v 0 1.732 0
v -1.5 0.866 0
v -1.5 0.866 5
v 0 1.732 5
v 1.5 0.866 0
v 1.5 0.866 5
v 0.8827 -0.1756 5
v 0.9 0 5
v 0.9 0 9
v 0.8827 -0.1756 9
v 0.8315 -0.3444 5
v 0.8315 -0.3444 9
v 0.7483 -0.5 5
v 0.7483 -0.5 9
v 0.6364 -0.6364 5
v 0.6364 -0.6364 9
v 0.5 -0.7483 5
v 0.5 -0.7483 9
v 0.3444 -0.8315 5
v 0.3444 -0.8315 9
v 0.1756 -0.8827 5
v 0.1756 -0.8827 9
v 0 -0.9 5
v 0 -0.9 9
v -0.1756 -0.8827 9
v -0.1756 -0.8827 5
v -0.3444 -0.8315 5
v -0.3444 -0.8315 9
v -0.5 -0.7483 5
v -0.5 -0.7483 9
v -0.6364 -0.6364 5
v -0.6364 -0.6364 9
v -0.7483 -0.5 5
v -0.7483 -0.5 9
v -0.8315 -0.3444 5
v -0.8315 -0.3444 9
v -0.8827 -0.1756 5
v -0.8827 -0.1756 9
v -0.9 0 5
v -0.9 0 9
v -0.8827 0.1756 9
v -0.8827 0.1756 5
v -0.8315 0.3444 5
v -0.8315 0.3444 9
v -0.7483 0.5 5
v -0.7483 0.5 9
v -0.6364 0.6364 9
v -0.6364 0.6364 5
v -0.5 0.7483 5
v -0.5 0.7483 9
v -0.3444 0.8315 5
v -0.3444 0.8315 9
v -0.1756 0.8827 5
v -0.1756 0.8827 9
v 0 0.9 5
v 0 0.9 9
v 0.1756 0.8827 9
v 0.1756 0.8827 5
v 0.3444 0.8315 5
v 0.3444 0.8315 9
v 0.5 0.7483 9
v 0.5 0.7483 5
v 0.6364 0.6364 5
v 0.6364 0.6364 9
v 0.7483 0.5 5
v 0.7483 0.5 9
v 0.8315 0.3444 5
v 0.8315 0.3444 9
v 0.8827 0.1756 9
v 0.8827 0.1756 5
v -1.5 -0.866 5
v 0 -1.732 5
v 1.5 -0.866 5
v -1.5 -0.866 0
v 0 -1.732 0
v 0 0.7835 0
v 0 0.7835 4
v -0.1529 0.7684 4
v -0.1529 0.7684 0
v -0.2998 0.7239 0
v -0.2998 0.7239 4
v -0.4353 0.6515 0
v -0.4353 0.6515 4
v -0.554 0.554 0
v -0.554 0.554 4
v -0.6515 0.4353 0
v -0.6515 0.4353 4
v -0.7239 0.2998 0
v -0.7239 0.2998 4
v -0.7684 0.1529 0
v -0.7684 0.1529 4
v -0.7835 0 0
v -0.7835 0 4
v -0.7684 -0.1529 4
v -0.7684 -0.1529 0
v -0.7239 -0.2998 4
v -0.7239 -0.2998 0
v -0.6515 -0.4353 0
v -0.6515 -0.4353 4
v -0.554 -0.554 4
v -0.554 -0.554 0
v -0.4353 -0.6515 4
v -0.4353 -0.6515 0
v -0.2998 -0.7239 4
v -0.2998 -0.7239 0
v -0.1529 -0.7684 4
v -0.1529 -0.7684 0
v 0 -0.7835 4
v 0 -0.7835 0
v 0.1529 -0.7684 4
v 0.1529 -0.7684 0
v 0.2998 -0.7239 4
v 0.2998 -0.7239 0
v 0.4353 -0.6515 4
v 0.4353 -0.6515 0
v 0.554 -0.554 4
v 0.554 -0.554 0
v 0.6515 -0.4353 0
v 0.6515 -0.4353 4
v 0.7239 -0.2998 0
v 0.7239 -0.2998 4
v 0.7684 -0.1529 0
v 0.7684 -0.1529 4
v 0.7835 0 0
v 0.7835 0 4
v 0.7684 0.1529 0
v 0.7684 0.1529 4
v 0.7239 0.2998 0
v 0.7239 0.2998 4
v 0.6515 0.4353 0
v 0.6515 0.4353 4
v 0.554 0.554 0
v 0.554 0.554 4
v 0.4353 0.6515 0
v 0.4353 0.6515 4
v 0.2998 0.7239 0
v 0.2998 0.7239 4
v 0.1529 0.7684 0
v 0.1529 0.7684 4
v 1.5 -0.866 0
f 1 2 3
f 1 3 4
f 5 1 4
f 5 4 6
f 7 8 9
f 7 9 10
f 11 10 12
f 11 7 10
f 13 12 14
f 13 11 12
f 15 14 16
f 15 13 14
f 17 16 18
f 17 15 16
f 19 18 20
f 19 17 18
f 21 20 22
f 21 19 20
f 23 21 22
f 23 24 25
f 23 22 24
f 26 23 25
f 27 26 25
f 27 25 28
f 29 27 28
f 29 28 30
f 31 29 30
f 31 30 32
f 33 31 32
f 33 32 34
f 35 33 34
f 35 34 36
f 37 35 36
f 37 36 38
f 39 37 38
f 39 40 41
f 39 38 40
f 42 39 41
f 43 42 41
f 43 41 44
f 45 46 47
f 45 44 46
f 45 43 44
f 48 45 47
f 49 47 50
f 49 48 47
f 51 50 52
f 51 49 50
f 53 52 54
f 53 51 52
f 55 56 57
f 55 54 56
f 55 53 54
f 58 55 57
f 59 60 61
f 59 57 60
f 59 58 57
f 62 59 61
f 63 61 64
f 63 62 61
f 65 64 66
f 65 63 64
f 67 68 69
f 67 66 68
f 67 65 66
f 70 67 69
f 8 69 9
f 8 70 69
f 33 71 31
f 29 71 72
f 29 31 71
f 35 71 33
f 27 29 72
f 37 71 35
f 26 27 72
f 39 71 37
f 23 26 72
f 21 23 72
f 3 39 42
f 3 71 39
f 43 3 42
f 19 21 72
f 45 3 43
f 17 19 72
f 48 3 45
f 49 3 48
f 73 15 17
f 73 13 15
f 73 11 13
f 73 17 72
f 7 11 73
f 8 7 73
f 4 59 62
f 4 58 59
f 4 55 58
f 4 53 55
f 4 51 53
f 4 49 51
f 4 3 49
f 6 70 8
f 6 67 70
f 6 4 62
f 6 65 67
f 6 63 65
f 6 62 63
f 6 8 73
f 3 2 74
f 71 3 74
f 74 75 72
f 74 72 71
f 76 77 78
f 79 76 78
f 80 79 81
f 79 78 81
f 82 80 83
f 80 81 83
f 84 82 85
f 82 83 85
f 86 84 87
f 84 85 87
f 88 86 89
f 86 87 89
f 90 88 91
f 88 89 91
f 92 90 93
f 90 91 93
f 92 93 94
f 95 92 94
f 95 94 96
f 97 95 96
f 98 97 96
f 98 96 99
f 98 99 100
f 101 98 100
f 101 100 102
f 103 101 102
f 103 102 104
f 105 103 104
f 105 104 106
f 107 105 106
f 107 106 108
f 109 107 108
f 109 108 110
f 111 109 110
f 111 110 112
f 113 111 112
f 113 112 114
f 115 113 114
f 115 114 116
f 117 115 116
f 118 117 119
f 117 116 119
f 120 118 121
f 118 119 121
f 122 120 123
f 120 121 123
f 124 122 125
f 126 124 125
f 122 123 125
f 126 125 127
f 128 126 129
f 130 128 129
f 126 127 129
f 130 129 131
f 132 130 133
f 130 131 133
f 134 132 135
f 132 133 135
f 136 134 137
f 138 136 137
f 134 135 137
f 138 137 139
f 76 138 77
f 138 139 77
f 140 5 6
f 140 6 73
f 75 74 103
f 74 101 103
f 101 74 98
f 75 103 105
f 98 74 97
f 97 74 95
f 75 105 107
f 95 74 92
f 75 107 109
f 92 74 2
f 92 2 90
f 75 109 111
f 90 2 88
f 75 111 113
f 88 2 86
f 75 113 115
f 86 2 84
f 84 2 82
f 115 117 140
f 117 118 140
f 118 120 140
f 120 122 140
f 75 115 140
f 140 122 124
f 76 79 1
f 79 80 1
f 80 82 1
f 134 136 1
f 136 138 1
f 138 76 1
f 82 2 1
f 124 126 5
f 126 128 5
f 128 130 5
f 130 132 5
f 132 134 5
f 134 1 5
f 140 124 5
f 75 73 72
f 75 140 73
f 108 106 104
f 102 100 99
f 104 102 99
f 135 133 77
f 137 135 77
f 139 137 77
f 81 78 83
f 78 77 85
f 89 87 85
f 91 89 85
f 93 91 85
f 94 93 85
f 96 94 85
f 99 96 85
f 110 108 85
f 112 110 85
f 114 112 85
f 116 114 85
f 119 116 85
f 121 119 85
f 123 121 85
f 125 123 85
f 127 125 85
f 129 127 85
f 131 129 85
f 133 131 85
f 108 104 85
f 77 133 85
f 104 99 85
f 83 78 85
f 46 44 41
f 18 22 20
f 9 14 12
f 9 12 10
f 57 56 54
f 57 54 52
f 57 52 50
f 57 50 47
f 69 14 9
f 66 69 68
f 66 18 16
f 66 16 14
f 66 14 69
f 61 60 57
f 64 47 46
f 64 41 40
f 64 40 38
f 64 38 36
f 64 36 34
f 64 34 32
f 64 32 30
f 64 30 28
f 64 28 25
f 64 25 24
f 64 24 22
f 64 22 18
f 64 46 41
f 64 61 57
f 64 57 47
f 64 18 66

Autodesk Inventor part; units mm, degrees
ref_plane "YZ Plane" through (0, 0, 0) normal (1, 0, 0) x (0, 1, 0)
ref_plane "XZ Plane" through (0, 0, 0) normal (0, 1, 0) x (-1, 0, 0)
ref_plane "XY Plane" through (0, 0, 0) normal (0, 0, 1) x (1, 0, 0)
sketch "Sketch1" plane through (0, 0, 0) normal (0, 0, 1) x (1, 0, 0)
  line L0 (1.5, 0.866) -> (1.5, -0.866)
  line L1 (1.5, -0.866) -> (0, -1.732)
  line L2 (0, -1.732) -> (-1.5, -0.866)
  line L3 (-1.5, 0.866) -> (-1.5, -0.866)
  line L4 (-1.5, 0.866) -> (0, 1.732)
  line L5 (0, 1.732) -> (1.5, 0.866)
  circle A0 centre (0, 0) radius 1.732 construction
  line L6 (0, 30.018) -> (0, -6.2677) construction
  line L7 (0, -13.5249) -> (0, 37.2751) projected
  line L8 (-2.4248, 0) -> (2.4248, 0) projected
  dimension "d0" = 3.464
  dimension "d20" = 2.9999
  dimension "d21" = 1.732
extrude "Hexagon1" add sketch "Sketch1" along normal blind 5
hole "Hole1" at (0, 0, 0) direction (0, 0, 1) diameter 1.567 depth 4 thread size "M2x0.4" class "6H" standard "ISO Metric profile"
sketch "Sketch2" plane through (0, 0, 5) normal (0, 0, 1) x (1, 0, 0)
  circle A0 centre (0, 0) radius 0.9
  dimension "d22" = 1.8
extrude "Extrusion2" add sketch "Sketch2" along normal blind 4
thread "Thread3" size "M2x0.4" class "6g" standard "ISO Metric profile" full length
properties part number "Spacer-M2-05" material "Brass, Soft Yellow, Welded"
